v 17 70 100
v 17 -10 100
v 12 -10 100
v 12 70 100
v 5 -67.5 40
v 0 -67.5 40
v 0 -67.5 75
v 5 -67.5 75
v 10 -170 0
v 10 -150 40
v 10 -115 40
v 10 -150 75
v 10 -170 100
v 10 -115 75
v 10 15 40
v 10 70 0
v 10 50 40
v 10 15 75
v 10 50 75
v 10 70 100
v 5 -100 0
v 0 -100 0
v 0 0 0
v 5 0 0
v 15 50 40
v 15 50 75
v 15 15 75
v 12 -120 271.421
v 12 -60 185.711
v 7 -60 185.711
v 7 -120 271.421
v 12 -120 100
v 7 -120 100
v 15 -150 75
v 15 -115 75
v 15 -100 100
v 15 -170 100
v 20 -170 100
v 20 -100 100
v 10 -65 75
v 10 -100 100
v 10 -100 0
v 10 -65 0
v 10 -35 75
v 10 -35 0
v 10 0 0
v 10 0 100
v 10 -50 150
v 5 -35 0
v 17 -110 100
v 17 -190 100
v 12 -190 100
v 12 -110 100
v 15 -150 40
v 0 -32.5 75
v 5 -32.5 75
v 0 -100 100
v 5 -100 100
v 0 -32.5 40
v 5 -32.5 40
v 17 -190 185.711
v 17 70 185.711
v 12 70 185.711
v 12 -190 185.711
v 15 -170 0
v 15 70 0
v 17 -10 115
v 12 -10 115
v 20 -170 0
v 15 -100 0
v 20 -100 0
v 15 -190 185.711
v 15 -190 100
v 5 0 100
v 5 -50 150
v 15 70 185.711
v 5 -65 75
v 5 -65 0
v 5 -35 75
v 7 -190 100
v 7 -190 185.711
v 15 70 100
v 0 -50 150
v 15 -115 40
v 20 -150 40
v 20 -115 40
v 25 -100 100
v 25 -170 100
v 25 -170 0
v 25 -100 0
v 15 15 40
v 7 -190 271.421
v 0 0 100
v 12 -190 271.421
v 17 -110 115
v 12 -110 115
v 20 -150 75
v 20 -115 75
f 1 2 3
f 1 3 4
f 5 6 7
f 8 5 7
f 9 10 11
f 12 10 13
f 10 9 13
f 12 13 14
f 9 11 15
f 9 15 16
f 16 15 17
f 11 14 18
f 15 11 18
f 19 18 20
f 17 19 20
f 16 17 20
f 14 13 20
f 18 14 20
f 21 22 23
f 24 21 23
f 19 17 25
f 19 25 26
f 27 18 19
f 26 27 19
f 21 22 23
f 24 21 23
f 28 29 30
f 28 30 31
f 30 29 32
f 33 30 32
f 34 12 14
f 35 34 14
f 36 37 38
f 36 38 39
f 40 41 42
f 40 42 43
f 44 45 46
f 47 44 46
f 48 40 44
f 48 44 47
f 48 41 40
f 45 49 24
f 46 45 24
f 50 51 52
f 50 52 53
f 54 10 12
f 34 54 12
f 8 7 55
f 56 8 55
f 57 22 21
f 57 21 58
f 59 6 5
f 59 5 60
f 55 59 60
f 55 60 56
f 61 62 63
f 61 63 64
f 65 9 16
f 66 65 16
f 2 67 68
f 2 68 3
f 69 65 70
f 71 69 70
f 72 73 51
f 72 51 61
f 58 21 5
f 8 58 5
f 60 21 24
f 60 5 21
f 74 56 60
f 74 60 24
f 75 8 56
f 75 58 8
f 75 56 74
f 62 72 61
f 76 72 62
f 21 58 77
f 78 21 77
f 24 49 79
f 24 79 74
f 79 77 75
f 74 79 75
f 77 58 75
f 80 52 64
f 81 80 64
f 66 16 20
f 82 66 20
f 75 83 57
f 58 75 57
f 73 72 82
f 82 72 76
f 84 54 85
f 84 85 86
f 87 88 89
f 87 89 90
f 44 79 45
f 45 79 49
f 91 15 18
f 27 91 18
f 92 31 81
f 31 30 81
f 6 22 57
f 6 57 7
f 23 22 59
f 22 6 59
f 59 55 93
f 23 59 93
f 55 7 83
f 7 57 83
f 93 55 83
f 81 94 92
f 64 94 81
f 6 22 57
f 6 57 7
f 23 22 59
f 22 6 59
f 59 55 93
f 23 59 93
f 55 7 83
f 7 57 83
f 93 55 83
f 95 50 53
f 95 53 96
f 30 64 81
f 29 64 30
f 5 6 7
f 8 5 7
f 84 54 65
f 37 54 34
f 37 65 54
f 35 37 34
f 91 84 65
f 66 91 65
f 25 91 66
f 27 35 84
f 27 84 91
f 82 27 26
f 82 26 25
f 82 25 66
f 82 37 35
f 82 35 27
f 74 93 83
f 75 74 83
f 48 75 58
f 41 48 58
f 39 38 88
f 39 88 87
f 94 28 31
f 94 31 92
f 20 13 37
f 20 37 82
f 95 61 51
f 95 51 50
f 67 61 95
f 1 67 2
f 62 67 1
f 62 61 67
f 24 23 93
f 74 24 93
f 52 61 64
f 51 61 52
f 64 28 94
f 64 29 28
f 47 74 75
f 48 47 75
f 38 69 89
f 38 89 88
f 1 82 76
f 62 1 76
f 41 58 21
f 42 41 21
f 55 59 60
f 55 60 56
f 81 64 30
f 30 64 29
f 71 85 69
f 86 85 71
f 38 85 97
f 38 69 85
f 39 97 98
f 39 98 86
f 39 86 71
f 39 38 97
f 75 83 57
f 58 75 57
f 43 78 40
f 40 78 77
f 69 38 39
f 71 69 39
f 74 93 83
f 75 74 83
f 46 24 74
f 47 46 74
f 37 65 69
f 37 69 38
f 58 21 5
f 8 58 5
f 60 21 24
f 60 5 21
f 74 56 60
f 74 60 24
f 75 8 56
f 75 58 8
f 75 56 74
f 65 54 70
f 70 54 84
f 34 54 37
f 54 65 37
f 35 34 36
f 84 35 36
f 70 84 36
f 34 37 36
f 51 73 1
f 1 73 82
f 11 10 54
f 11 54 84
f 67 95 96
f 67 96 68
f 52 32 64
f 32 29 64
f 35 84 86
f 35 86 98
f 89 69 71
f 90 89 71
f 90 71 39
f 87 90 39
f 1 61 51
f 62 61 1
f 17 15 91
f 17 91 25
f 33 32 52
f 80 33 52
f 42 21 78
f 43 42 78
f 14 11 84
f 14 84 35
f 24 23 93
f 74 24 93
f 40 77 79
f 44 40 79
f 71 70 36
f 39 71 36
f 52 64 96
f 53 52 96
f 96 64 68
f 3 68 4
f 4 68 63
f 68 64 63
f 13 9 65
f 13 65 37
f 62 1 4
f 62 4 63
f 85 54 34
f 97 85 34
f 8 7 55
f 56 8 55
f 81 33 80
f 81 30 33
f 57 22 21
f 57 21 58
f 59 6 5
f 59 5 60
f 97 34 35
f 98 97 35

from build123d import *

# Parameters (mm, degrees)
F0_W      = 100
F0_H      = 100
F0_W_2    = 35
F0_H_2    = 35
F1_DEPTH  = 5
F2_W      = 2.5
F2_H      = 35
F3_DEPTH  = 5
F4_DEPTH  = 5
F5_W      = 240
F5_H      = 100
F5_W_2    = 35
F5_H_2    = 35
F6_DEPTH  = 5
F7_W      = 70
F7_H      = 100
F7_W_2    = 35
F7_H_2    = 35
F8_DEPTH  = 5
F9_W      = 70
F9_H      = 100
F10_DEPTH = 5
F11_W     = 260
F11_H     = 85.7106781187
F12_DEPTH = 2
F14_DEPTH = 5
F15_W     = 70
F15_H     = 85.7106781187
F16_DEPTH = 5


with BuildPart() as f1:
    # F0 (on Right) → F1 (new body)
    with BuildSketch(Plane.YZ):
        with Locations((-50, 50)):
            Rectangle(F0_W, F0_H)
        with Locations((-50, 57.5)):
            Rectangle(F0_W_2, F0_H_2, mode=Mode.SUBTRACT)
        Polygon((-100, 100), (0, 100), (-50, 150), align=None)
    extrude(amount=F1_DEPTH)


with BuildPart() as f3:
    # F2 (on face) → F3 (new body)
    with BuildSketch(Plane.YZ.offset(5)):
        Polygon((-100, 100), (-100, 0), (-65, 0), (-65, 40), (-67.5, 40), (-67.5, 75), (-65, 75), (-35, 75), (-32.5, 75), (-32.5, 40), (-35, 40), (-35, 0), (0, 0), (0, 100), (-50, 150), align=None)
        with Locations((-66.25, 57.5)):
            Rectangle(F2_W, F2_H)
        with Locations((-33.75, 57.5)):
            Rectangle(F2_W, F2_H)
    extrude(amount=F3_DEPTH)


with BuildPart() as f4:
    # F0 (on Right) → F4 (new body)
    with BuildSketch(Plane.YZ):
        with Locations((-50, 50)):
            Rectangle(F0_W, F0_H)
        with Locations((-50, 57.5)):
            Rectangle(F0_W_2, F0_H_2, mode=Mode.SUBTRACT)
        Polygon((-100, 100), (0, 100), (-50, 150), align=None)
    extrude(amount=F4_DEPTH)


with BuildPart() as f6:
    # F5 (on face) → F6 (new body)
    with BuildSketch(Plane.YZ.offset(10)):
        with Locations((-50, 50)):
            Rectangle(F5_W, F5_H)
        with Locations((-132.5, 57.5)):
            Rectangle(F5_W_2, F5_H_2, mode=Mode.SUBTRACT)
        with Locations((32.5, 57.5)):
            Rectangle(F5_W_2, F5_H_2, mode=Mode.SUBTRACT)
    extrude(amount=F6_DEPTH)


with BuildPart() as f8:
    # F7 (on face) → F8 (new body)
    with BuildSketch(Plane.YZ.offset(15)):
        with Locations((-135, 50)):
            Rectangle(F7_W, F7_H)
        with Locations((-132.5, 57.5)):
            Rectangle(F7_W_2, F7_H_2, mode=Mode.SUBTRACT)
    extrude(amount=F8_DEPTH)


with BuildPart() as f10:
    # F9 (on face) → F10 (new body)
    with BuildSketch(Plane.YZ.offset(20)):
        with Locations((-135, 50)):
            Rectangle(F9_W, F9_H)
    extrude(amount=F10_DEPTH)


with BuildPart() as f12:
    # F11 (on face) → F12 (new body)
    with BuildSketch(Plane.YZ.offset(15)):
        with Locations((-60, 142.8553390593)):
            Rectangle(F11_W, F11_H)
    extrude(amount=F12_DEPTH)


with BuildPart() as f14:
    # F13 (on face) → F14 (new body)
    with BuildSketch(Plane.YZ.offset(17)):
        Polygon((70, 185.7106781187), (-190, 185.7106781187), (-190, 100), (-110, 100), (-110, 115), (-10, 115), (-10, 100), (70, 100), align=None)
    extrude(amount=-F14_DEPTH)


with BuildPart() as f16:
    # F15 (on face) → F16 (new body)
    with BuildSketch(Plane(origin=(12, 0, 0), x_dir=(0, -1, 0), z_dir=(-1, 0, 0))):
        with Locations((155, 142.8553390593)):
            Rectangle(F15_W, F15_H)
        Polygon((120, 100), (120, 185.7106781187), (60, 185.7106781187), align=None)
    extrude(amount=F16_DEPTH)


with BuildPart() as f17_1:
    # F17: instance of F16
    add(f16.part.mirror(Plane(origin=(9.5, -125, 185.7106781187), x_dir=(1, 0, 0), z_dir=(0, 0, 1))))


solid = Compound([f1.part, f3.part, f4.part, f6.part, f8.part, f10.part, f12.part, f14.part, f16.part, f17_1.part])
